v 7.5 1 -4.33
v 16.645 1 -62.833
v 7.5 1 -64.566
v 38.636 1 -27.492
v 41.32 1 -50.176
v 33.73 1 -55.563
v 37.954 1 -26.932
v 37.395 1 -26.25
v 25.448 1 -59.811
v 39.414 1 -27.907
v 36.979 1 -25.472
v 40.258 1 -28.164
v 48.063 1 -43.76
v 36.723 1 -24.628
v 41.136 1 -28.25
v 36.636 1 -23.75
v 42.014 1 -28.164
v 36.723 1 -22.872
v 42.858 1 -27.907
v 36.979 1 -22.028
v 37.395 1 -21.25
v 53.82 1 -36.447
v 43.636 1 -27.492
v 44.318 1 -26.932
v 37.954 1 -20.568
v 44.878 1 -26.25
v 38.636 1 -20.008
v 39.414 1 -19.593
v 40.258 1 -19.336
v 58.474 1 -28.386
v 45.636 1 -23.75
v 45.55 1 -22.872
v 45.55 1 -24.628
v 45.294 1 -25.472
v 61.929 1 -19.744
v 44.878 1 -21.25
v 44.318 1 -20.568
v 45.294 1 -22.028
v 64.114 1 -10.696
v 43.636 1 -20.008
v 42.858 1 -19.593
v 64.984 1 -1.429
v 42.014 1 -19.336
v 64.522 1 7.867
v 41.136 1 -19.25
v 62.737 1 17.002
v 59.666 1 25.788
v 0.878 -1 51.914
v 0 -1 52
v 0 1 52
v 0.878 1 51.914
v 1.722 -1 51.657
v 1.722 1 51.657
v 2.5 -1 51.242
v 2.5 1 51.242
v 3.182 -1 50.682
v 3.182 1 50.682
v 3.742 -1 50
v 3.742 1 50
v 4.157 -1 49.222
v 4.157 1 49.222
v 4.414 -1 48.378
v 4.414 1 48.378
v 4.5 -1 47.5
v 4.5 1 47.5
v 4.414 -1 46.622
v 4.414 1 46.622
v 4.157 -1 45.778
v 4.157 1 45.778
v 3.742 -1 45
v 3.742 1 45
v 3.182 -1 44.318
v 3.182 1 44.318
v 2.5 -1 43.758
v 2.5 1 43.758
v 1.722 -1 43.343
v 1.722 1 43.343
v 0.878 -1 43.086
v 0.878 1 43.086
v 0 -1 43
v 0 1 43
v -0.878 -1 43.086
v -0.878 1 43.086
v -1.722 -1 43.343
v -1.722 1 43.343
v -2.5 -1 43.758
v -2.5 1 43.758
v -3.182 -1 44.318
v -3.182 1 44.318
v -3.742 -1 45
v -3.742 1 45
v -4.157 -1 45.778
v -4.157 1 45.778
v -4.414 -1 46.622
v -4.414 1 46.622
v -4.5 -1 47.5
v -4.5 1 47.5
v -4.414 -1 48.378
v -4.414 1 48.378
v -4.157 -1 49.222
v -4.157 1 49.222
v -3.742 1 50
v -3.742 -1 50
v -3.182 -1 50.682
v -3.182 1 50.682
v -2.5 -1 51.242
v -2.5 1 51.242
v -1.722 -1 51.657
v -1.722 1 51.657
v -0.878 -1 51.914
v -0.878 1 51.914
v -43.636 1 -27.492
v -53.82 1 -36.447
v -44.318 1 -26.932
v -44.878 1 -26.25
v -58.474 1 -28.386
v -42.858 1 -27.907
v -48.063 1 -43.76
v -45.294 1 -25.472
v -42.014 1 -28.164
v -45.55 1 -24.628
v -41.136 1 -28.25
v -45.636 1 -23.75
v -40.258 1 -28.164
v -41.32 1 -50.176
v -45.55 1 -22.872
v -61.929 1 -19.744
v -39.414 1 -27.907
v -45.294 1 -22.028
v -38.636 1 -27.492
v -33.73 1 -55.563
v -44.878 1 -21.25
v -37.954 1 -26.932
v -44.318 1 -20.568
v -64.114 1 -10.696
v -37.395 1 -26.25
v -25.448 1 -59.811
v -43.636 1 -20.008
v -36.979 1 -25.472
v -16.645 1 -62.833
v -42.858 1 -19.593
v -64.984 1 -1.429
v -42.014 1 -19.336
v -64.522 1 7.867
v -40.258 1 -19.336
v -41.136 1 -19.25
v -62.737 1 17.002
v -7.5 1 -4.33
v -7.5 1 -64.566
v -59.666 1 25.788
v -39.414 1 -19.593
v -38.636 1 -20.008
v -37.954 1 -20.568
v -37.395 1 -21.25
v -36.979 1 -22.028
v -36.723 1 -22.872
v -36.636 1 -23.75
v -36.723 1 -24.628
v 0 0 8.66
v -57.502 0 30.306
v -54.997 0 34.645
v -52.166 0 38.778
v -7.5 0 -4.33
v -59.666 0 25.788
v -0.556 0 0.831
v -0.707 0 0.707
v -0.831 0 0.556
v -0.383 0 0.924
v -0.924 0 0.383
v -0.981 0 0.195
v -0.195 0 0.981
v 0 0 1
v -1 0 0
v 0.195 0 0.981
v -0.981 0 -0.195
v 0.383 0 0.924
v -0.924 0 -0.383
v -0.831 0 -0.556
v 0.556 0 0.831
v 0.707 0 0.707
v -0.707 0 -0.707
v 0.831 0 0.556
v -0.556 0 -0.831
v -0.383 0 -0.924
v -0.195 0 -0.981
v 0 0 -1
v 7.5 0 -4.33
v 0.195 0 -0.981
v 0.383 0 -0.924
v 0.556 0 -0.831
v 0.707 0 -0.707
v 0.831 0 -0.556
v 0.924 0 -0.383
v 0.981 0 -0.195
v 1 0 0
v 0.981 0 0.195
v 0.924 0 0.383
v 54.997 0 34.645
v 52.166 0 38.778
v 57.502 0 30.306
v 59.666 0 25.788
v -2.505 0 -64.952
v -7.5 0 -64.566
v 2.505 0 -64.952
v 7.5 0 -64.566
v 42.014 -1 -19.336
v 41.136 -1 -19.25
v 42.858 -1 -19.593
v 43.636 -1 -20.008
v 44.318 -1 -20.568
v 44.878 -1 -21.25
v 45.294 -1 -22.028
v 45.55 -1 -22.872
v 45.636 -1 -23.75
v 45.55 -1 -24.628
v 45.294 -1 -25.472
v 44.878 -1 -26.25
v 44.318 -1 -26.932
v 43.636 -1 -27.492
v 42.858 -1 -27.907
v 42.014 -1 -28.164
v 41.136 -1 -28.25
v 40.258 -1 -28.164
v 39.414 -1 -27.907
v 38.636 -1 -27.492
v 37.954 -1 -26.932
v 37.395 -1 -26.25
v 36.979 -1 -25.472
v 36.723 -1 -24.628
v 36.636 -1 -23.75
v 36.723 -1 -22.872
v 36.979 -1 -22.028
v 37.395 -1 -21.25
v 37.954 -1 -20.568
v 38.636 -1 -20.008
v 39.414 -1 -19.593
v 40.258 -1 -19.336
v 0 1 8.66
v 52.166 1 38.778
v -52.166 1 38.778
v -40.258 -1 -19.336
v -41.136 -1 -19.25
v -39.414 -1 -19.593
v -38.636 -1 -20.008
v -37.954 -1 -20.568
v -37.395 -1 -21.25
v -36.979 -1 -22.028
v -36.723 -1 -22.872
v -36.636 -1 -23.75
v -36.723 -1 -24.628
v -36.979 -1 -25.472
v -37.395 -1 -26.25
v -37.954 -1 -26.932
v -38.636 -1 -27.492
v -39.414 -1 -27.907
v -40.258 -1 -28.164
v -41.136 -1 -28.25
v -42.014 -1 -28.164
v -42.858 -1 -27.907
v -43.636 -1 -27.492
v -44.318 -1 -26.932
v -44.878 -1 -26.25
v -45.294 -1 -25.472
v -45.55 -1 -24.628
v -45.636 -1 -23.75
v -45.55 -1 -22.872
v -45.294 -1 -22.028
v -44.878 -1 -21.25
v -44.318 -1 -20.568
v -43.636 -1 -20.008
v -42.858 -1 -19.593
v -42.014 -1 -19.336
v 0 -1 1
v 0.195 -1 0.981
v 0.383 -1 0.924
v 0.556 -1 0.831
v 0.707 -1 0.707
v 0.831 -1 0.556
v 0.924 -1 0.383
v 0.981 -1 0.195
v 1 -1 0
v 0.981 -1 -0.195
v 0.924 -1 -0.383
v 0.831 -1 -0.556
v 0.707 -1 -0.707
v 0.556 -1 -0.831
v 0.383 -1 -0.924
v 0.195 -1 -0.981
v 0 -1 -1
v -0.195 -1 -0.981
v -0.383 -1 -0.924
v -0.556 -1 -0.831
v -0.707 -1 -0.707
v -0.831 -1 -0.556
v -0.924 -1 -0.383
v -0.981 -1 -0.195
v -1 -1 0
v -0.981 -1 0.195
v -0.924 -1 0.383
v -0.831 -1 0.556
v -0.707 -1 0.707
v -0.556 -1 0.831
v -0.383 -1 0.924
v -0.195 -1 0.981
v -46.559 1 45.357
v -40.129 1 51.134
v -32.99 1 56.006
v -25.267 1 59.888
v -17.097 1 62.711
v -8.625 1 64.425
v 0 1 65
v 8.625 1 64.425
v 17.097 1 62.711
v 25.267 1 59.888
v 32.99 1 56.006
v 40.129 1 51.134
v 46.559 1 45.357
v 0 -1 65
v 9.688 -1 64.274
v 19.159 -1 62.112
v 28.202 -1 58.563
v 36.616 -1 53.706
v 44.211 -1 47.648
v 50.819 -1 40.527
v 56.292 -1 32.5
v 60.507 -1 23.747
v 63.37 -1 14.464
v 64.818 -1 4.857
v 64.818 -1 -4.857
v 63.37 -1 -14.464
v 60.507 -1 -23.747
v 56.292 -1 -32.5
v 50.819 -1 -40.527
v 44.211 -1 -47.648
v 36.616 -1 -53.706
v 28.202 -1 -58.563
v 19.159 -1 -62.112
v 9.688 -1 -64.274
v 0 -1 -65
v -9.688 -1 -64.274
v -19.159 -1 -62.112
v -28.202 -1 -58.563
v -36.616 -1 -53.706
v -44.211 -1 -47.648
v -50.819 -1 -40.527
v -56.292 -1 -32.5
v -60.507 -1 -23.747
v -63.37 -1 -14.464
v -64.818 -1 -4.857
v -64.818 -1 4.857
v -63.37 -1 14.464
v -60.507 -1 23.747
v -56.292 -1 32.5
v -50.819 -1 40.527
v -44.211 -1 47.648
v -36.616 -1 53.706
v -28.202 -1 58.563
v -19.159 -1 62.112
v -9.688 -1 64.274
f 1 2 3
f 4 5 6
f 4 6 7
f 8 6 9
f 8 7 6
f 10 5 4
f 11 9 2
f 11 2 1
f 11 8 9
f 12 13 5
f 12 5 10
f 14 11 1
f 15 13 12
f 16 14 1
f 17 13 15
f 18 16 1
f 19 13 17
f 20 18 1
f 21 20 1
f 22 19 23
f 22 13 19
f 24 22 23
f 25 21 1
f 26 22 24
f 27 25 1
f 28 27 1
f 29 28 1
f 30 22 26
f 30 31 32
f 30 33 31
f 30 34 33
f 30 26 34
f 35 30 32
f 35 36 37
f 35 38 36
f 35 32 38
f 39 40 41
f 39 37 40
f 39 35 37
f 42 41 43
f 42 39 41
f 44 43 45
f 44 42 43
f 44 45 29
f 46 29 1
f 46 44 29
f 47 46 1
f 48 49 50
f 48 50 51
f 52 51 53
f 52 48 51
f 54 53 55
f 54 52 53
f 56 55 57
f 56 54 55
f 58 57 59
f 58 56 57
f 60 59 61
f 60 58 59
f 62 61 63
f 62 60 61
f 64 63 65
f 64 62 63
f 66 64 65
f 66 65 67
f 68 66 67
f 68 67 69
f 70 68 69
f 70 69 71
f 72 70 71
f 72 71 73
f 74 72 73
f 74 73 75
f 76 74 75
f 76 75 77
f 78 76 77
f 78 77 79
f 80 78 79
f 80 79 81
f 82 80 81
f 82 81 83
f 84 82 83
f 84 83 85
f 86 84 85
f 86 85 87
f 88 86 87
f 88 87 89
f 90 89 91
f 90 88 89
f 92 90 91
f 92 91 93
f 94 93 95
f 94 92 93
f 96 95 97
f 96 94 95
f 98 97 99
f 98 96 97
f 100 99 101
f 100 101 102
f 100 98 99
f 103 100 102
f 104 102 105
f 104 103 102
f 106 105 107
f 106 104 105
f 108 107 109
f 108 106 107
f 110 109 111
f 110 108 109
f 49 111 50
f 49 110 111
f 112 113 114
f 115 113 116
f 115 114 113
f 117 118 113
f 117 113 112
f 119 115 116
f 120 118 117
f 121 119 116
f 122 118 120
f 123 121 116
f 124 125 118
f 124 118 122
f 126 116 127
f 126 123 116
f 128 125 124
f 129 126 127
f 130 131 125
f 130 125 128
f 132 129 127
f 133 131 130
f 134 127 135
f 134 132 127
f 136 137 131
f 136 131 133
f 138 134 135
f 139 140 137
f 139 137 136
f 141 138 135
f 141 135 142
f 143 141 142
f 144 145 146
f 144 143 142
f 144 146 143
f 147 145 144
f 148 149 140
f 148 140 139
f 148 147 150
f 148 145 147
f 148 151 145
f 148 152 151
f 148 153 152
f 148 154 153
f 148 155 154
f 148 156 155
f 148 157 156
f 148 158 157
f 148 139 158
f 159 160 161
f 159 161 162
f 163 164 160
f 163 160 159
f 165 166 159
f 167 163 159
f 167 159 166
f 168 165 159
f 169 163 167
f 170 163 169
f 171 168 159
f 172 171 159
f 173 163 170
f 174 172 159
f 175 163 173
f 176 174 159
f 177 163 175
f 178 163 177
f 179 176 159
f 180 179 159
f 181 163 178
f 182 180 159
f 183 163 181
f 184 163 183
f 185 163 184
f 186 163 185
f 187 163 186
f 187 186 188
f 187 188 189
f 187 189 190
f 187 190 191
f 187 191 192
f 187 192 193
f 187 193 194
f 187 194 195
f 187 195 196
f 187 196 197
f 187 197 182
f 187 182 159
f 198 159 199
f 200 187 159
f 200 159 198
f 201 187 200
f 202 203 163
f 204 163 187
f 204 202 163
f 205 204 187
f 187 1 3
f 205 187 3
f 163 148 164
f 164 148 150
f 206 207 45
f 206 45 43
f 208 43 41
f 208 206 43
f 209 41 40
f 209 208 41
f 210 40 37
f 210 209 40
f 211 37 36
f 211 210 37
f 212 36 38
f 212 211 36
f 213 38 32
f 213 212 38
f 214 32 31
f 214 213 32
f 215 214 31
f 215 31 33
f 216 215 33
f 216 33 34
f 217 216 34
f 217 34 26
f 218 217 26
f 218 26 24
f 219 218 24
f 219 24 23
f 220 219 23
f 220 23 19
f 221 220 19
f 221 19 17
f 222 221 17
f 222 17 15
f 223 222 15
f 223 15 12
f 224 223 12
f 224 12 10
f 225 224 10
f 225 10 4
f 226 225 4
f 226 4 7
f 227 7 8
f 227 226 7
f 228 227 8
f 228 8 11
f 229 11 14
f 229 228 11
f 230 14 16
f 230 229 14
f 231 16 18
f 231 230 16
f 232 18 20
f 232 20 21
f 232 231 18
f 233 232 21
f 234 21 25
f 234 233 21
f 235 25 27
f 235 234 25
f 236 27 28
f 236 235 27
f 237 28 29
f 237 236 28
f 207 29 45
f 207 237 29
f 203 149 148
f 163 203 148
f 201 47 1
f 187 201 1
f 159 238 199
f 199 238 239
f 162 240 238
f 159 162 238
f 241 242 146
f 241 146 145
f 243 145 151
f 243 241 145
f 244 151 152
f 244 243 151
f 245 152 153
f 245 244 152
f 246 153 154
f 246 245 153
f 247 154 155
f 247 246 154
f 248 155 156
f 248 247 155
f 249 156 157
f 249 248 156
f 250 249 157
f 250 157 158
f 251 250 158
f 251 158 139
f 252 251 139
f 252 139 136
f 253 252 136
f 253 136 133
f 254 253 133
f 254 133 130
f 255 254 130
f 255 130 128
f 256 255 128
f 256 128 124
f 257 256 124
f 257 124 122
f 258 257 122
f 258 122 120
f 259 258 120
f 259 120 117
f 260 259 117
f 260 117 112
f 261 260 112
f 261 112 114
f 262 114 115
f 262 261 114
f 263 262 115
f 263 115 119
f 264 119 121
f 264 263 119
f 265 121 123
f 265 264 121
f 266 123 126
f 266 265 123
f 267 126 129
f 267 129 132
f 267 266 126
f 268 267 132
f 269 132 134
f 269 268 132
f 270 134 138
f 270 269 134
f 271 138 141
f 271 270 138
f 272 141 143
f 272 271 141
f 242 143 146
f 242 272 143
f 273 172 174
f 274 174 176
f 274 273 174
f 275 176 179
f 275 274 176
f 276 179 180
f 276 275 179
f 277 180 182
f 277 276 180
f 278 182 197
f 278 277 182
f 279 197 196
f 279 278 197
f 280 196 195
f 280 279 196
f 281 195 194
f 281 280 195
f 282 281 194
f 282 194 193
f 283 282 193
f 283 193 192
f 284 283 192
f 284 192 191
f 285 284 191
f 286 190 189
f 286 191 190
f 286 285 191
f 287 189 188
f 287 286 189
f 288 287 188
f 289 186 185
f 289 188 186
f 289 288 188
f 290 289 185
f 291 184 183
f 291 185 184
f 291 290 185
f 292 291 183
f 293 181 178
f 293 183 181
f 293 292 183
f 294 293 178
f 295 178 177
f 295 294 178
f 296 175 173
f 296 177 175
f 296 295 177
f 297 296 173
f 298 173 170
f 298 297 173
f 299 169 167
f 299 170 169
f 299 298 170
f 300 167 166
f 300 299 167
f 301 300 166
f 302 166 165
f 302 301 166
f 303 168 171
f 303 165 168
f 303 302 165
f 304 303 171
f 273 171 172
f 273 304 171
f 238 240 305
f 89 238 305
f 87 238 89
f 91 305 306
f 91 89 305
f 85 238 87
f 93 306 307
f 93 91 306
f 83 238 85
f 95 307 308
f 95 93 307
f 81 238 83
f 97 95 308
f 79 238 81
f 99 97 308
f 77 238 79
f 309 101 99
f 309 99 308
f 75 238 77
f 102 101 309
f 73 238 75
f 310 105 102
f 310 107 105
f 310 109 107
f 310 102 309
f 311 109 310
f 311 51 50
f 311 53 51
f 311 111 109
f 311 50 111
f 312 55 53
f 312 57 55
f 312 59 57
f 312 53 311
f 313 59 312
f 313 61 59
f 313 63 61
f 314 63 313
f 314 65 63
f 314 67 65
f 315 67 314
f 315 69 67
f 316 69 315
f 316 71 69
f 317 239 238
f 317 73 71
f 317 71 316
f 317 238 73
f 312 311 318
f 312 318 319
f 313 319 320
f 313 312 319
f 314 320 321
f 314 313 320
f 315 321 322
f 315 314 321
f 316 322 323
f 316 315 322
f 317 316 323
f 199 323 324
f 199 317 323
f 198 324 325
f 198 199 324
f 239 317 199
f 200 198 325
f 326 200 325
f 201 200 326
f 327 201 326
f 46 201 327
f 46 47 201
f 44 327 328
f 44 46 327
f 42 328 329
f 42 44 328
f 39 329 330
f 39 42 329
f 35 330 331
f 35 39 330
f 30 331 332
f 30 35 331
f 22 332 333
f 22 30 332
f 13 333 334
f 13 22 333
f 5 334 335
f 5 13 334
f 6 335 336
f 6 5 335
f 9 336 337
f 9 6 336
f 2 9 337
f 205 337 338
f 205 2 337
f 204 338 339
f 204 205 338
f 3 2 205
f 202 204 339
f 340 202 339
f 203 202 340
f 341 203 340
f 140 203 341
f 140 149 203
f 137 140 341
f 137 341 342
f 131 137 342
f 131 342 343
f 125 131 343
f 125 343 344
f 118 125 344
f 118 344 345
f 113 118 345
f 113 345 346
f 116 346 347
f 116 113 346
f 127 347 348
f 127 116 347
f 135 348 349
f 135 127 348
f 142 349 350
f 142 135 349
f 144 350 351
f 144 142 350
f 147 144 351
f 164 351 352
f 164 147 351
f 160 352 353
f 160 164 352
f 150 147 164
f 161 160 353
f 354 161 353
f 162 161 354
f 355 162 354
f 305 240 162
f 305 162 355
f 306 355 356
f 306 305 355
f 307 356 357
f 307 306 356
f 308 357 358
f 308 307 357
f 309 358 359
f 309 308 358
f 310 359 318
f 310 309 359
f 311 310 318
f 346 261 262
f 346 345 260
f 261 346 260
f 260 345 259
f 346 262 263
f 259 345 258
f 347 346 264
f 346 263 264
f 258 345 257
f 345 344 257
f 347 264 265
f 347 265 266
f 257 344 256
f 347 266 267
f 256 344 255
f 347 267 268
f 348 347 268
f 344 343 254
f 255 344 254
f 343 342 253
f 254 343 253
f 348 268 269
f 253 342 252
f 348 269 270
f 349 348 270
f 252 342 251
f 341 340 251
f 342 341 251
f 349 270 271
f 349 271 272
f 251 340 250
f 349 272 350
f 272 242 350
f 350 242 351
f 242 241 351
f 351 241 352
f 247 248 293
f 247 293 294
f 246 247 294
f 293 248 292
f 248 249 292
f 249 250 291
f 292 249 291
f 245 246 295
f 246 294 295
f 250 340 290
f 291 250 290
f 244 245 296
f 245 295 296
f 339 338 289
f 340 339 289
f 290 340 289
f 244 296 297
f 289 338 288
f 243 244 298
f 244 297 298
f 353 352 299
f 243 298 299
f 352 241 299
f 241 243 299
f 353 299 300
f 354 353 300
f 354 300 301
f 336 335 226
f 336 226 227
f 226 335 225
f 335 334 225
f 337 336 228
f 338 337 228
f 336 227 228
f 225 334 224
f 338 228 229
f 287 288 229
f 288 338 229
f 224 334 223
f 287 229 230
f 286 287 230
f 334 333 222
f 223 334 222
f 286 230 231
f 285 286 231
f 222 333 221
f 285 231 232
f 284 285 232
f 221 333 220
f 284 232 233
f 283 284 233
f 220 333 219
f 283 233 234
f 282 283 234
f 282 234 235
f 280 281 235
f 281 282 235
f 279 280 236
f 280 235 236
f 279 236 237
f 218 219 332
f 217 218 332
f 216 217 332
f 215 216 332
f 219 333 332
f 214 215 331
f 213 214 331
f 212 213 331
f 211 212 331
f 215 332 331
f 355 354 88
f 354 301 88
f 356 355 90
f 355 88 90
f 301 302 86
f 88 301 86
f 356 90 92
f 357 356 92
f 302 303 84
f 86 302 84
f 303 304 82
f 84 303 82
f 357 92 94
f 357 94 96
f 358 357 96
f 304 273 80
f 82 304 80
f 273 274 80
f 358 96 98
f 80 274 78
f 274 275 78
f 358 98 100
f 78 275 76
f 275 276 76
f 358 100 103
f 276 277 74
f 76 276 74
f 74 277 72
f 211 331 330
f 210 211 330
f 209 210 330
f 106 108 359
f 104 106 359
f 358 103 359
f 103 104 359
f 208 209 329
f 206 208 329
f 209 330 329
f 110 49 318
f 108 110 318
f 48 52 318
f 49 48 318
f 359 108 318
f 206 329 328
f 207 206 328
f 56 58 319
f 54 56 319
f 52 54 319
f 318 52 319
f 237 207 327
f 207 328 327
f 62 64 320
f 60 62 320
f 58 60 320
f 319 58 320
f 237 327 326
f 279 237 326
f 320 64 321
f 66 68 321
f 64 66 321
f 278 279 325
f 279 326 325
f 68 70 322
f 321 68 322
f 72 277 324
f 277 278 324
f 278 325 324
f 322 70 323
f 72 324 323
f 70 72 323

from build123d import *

# Parameters (mm, degrees)
SKETCH1_R               = 65
SKETCH1_R_2             = 1
BOSS_EXTRUDE1_DEPTH     = 1
CUT_EXTRUDE1_DEPTH      = 1
CUT_EXTRUDE2_DEPTH      = 1
CUT_EXTRUDE2_DEPTH_BACK = 92.929320676
SKETCH3_R               = 4.5


with BuildPart() as part:
    # Sketch1 → Boss-Extrude1 (new, symmetric)
    with BuildSketch(Plane(origin=(0, 0, 0), x_dir=(1, 0, 0), z_dir=(0, 1, 0))):
        Circle(SKETCH1_R)
        Circle(SKETCH1_R_2, mode=Mode.SUBTRACT)
    extrude(amount=BOSS_EXTRUDE1_DEPTH, both=True)

    # Sketch2 → Cut-Extrude1 (cut)
    with BuildSketch(Plane(origin=(0, 1, 0), x_dir=(1, 0, 0), z_dir=(0, 1, 0))):
        Polygon((67.534801337, -30.330981694), (7.5, 4.330127019), (7.5, 73.652344444), (-7.5, 73.652344444), (-7.5, 4.330127019), (-67.534801337, -30.330981694), (-60.034801337, -43.32136275), (0, -8.660254038), (60.034801337, -43.32136275), align=None)
    extrude(amount=-CUT_EXTRUDE1_DEPTH, mode=Mode.SUBTRACT)

    # Sketch3 → Cut-Extrude2 (cut, two sides: drawn at the far end of the back side and taken through both)
    with BuildSketch(Plane(origin=(0, 0, 0), x_dir=(1, 0, 0), z_dir=(0, 1, 0)).offset(-CUT_EXTRUDE2_DEPTH_BACK)):
        with Locations((41.13620668, 23.75)):
            Circle(SKETCH3_R)
        with Locations((0, -47.5)):
            Circle(SKETCH3_R)
        with Locations((-41.13620668, 23.75)):
            Circle(SKETCH3_R)
    extrude(amount=CUT_EXTRUDE2_DEPTH + CUT_EXTRUDE2_DEPTH_BACK, mode=Mode.SUBTRACT)


solid = part.part
